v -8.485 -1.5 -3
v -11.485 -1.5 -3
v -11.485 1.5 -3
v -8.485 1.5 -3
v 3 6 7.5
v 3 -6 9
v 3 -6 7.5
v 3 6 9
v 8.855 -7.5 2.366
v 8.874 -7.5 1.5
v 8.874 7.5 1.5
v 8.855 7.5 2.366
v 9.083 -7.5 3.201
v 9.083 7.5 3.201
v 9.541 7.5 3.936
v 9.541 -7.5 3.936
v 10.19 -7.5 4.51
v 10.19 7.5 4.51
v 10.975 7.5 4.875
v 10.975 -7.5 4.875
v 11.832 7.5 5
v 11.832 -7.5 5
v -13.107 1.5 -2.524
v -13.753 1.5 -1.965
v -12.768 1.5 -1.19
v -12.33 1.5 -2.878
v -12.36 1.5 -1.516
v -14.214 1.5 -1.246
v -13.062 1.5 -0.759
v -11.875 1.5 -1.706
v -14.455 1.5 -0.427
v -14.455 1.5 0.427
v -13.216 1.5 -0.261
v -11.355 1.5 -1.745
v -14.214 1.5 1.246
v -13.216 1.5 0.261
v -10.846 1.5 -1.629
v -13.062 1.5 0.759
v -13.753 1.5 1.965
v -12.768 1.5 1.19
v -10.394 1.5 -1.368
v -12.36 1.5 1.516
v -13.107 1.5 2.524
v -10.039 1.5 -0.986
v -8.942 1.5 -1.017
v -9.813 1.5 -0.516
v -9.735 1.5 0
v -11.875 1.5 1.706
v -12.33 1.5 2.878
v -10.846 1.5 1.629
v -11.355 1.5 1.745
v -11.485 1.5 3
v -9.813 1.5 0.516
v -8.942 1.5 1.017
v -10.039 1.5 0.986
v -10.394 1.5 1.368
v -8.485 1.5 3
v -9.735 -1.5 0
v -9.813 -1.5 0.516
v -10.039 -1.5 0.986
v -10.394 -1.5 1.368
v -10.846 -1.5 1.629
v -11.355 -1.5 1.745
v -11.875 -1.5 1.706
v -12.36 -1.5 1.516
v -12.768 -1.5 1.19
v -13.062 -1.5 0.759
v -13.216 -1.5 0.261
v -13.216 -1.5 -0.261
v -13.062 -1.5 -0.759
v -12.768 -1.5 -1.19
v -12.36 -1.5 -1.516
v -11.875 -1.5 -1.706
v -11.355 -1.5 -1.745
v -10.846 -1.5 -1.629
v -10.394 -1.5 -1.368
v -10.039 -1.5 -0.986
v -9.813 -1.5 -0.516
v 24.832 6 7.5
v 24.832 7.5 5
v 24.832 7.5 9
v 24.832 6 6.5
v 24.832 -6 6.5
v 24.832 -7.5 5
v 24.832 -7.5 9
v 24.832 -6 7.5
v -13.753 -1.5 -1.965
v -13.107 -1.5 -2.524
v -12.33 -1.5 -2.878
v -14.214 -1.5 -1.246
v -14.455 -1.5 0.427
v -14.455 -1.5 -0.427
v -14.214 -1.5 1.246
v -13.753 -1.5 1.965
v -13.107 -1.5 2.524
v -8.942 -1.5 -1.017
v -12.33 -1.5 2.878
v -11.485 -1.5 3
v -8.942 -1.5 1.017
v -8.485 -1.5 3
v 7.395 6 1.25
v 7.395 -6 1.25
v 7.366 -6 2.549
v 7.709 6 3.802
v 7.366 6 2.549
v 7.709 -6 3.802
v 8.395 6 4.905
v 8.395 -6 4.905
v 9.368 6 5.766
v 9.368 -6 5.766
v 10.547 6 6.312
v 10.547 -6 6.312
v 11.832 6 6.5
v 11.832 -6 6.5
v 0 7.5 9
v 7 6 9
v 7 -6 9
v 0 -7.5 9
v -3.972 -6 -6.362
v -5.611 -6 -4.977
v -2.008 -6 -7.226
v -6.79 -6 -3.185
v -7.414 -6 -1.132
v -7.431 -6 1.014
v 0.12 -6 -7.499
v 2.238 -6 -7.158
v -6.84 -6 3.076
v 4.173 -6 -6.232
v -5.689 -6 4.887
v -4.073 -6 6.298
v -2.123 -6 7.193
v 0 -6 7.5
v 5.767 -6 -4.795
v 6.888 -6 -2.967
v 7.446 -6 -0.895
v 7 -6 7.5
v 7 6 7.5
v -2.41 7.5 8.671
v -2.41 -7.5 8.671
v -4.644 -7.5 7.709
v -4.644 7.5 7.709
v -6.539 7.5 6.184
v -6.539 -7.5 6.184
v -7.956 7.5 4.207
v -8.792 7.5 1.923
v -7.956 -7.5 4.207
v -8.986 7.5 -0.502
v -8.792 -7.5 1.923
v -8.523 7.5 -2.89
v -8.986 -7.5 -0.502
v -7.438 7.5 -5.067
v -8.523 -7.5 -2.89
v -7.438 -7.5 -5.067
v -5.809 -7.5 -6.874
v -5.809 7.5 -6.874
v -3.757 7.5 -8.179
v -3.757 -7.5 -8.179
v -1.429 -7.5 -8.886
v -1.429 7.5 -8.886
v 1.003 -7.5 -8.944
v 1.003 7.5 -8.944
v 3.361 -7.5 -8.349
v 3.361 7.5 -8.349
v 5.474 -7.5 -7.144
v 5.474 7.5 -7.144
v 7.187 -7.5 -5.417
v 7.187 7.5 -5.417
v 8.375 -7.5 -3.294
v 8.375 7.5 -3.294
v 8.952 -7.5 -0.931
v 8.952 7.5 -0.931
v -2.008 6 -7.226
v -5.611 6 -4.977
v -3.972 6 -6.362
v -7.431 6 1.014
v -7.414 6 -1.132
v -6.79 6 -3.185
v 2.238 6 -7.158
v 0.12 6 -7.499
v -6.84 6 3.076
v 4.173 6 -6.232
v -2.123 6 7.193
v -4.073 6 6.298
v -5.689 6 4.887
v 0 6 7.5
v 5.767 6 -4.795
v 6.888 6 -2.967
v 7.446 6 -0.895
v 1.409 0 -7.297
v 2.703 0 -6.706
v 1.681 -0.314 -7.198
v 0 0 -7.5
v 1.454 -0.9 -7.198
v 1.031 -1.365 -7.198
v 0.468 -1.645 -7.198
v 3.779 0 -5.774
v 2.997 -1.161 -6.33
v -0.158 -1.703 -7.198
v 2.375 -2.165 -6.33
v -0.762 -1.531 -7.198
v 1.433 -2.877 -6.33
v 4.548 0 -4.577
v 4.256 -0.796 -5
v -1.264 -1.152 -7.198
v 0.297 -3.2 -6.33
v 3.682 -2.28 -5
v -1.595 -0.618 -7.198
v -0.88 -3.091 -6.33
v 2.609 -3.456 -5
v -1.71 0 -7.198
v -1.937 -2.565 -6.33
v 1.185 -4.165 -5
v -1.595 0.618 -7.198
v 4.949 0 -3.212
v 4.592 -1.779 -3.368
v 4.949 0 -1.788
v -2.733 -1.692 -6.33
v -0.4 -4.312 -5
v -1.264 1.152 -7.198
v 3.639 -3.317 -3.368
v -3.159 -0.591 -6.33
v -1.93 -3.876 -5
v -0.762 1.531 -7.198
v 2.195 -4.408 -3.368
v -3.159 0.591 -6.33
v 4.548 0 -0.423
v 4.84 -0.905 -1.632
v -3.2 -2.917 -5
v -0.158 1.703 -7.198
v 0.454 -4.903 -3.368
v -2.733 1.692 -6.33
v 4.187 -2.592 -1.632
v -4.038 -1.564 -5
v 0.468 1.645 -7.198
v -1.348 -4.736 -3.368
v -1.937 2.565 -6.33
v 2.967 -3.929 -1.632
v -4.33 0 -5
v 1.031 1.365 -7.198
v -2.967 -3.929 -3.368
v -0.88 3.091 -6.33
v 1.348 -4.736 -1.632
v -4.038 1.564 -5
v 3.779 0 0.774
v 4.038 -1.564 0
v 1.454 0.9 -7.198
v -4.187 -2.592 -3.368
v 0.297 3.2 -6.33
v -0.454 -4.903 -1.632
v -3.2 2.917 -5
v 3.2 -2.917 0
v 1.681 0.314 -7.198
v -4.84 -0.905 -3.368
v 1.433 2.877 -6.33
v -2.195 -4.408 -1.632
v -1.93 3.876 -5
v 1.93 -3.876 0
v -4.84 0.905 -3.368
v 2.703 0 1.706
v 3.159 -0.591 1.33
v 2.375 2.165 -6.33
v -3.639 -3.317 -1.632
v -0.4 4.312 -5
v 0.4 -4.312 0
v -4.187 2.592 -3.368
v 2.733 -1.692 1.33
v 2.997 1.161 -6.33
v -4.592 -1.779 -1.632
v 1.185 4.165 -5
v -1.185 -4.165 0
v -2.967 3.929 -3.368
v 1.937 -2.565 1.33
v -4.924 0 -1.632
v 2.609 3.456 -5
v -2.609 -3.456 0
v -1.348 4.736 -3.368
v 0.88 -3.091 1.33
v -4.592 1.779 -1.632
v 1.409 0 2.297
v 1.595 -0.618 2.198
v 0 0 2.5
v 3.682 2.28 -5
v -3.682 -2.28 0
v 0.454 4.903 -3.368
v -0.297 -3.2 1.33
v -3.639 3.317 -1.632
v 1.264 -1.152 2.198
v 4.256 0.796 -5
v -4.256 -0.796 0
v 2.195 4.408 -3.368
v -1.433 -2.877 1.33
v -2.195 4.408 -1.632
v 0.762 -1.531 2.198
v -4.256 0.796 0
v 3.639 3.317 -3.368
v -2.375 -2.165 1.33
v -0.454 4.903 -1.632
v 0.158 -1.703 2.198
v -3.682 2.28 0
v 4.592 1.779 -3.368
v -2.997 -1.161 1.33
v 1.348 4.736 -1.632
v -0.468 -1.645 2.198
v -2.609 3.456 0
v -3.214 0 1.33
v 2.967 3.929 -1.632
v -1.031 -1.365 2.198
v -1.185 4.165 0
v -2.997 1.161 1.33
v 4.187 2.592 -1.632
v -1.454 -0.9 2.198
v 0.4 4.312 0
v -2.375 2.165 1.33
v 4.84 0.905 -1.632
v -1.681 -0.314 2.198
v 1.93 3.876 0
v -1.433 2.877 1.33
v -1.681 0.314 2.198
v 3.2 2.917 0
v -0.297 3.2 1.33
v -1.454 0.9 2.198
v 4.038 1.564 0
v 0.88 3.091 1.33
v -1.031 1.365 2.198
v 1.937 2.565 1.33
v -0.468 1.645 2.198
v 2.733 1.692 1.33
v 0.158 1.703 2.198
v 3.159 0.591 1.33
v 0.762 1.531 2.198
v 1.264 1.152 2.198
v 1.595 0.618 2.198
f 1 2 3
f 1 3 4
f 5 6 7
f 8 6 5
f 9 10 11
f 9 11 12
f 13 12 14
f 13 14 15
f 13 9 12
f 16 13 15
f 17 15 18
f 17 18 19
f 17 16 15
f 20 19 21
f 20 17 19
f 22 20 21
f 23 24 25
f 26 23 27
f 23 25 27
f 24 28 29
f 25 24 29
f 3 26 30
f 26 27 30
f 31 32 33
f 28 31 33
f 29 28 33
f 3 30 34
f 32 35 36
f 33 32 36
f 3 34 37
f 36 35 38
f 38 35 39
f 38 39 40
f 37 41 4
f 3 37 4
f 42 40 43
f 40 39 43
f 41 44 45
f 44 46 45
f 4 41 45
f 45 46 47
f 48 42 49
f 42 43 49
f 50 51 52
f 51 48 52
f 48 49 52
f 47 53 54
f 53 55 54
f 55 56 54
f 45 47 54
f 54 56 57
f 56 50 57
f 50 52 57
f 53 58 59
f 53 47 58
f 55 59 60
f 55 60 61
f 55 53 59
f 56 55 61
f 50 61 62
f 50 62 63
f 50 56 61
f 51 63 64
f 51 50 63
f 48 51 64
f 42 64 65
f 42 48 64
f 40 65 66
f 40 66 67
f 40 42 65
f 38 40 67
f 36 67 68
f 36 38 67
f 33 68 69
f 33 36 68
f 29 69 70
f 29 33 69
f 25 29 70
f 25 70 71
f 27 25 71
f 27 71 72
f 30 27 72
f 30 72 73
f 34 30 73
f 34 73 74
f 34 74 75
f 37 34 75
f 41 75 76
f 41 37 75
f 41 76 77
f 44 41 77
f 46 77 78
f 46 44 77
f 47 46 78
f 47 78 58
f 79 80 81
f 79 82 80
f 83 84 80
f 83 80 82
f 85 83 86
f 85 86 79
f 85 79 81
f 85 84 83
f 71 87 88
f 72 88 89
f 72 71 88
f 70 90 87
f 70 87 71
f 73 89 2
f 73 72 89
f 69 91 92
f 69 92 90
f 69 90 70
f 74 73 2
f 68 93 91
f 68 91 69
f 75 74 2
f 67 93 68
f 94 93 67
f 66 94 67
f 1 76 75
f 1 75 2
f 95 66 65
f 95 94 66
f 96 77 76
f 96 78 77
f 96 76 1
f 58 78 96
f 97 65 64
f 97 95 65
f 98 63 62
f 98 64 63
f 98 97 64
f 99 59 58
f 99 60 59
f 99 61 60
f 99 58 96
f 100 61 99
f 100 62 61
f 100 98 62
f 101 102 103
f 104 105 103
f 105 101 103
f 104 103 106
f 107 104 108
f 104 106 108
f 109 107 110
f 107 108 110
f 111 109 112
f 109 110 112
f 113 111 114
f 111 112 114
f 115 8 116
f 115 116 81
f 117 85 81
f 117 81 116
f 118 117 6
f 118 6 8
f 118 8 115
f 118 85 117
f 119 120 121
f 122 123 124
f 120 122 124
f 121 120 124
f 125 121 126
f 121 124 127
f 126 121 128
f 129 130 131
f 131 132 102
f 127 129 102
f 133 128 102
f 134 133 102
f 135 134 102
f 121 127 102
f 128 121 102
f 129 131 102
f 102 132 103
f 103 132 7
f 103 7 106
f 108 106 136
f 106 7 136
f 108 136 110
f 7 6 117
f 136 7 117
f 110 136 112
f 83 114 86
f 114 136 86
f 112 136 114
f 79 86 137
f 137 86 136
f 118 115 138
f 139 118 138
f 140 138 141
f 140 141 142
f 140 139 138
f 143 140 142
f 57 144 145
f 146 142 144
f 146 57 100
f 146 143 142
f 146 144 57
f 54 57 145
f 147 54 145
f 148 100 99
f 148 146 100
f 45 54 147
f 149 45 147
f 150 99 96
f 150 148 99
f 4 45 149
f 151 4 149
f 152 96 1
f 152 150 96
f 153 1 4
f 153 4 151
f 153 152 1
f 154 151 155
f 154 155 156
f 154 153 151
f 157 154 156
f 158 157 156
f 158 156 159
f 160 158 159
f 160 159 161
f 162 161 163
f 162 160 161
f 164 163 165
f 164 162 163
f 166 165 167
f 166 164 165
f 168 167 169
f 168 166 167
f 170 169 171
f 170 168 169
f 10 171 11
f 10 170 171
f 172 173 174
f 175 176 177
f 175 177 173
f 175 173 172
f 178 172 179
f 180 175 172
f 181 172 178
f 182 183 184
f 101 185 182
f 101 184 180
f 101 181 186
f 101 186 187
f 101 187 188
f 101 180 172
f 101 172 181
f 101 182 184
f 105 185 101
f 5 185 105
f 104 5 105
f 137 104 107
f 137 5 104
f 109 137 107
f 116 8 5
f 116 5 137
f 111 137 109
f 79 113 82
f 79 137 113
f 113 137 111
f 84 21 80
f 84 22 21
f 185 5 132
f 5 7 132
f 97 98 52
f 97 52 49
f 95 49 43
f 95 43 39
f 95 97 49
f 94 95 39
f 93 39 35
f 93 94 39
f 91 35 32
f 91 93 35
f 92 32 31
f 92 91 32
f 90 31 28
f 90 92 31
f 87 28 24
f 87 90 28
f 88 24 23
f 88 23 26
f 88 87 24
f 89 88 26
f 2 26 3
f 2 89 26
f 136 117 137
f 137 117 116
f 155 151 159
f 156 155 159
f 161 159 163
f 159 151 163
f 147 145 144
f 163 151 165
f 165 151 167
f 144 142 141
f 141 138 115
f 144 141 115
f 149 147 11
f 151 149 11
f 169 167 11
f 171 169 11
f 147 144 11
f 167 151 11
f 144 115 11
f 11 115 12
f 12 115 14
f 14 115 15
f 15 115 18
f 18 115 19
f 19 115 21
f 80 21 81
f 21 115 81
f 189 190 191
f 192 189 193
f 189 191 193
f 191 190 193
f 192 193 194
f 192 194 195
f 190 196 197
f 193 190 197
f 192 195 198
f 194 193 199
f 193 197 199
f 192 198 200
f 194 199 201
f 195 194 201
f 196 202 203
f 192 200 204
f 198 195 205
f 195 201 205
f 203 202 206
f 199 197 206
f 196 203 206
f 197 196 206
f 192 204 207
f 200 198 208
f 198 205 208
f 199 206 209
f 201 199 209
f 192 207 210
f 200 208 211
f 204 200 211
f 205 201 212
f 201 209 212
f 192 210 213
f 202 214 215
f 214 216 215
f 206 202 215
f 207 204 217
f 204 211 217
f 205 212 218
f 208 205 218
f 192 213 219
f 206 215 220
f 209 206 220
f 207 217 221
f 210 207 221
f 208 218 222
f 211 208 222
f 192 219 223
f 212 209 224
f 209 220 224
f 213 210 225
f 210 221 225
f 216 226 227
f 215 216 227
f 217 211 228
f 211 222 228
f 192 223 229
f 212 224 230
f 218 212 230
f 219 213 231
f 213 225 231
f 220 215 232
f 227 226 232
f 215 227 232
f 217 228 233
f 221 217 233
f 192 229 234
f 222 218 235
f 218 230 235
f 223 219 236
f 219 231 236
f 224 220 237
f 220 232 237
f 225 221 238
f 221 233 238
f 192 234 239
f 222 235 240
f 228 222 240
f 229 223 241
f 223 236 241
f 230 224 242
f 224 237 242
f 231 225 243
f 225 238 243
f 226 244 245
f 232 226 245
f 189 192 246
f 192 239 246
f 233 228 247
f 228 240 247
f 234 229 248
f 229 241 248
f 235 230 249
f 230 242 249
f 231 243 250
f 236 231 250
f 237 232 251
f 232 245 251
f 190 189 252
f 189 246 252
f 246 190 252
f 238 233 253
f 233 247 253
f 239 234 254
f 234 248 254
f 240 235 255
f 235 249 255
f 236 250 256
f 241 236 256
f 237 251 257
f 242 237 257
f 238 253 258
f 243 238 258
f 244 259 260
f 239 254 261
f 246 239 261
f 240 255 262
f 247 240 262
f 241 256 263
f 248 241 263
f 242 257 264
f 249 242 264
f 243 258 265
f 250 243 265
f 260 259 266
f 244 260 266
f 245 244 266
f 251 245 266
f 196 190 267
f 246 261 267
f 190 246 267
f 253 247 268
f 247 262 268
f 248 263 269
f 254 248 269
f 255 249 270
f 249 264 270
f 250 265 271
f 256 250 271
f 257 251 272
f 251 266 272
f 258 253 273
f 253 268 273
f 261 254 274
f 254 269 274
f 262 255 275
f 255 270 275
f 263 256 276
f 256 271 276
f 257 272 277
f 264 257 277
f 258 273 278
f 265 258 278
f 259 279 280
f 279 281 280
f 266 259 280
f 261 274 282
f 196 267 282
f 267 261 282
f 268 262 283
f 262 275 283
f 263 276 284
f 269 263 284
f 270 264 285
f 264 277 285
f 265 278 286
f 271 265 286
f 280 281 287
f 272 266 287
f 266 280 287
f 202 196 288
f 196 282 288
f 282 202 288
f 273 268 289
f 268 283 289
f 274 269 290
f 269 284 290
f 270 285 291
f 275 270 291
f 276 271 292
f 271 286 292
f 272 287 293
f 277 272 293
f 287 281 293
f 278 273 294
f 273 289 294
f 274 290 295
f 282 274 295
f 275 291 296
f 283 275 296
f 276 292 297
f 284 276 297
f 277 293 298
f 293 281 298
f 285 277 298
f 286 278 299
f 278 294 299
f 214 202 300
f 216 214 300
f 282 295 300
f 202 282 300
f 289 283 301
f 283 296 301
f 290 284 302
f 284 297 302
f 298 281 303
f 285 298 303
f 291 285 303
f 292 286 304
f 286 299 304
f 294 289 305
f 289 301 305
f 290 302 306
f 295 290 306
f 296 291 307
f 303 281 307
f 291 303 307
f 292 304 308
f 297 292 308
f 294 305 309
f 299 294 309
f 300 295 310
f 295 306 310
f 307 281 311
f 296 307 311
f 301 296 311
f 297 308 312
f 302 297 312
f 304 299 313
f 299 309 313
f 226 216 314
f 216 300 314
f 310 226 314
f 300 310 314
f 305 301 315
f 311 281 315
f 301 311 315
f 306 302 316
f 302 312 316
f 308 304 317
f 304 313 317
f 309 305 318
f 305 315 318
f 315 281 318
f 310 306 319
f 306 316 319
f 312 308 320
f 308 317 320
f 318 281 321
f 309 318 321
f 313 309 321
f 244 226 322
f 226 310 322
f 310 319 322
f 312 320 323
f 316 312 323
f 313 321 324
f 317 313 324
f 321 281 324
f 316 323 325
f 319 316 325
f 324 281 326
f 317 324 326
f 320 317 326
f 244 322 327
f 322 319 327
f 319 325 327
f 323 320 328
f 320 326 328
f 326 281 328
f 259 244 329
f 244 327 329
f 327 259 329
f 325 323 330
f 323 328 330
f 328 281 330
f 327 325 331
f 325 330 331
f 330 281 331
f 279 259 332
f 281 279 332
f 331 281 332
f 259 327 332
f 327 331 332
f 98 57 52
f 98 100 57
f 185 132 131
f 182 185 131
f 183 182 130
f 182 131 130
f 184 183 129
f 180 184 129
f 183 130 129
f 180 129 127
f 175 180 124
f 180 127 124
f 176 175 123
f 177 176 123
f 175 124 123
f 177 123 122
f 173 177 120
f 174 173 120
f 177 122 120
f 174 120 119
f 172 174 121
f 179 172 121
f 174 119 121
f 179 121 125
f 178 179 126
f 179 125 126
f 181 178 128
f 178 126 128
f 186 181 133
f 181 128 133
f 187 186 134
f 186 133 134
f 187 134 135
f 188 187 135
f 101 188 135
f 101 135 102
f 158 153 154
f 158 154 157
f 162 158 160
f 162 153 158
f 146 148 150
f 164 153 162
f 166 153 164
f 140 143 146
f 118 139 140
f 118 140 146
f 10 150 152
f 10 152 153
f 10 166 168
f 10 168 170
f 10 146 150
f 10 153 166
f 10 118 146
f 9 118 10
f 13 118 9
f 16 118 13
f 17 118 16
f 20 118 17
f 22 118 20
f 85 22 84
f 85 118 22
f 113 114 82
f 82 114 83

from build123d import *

# Parameters (mm, degrees)
F1_DEPTH = 7.5
F2_T     = -1.5
F3_W     = 4
F3_H     = 12
F4_DEPTH = 1.5
F5_R     = 1.75
F6_DEPTH = 1.5


with BuildPart() as f1:
    # F0 (on Front) → F1 (new body, symmetric)
    with BuildSketch(Plane.XZ):
        with BuildLine():
            Line((24.83216, 9), (0, 9))
            ThreePointArc((0, 9), (-5.809475, -6.873864), (8.87412, 1.5))
            ThreePointArc((8.87412, 1.5), (9.540872, 3.936492), (11.83216, 5))
            Line((11.83216, 5), (24.83216, 5))
            Line((24.83216, 5), (24.83216, 9))
        make_face()
    extrude(amount=F1_DEPTH, both=True)

    # F2
    f2_openings = [f1.faces().sort_by_distance(p)[0] for p in [
        (24.83216, 0, 7),
    ]]
    offset(amount=F2_T, openings=f2_openings)

    # F3 (on face) → F4 (cut)
    with BuildSketch(Plane.XY.offset(9)):
        with Locations((5, 0)):
            Rectangle(F3_W, F3_H)
    extrude(amount=-F4_DEPTH, mode=Mode.SUBTRACT)

    # F5 (on Front) → F6 (join, symmetric)
    with BuildSketch(Plane.XZ):
        with BuildLine():
            Line((-8.485281, 3), (-11.485281, 3))
            ThreePointArc((-11.485281, 3), (-14.485281, 0), (-11.485281, -3))
            Line((-11.485281, -3), (-8.485281, -3))
            Line((-8.485281, -3), (-8.485281, 3))
        make_face()
        with Locations((-11.485281, 0)):
            Circle(F5_R, mode=Mode.SUBTRACT)
    extrude(amount=F6_DEPTH, both=True)


with BuildPart() as f8:
    # F7 (on Front) → F8 (revolve)
    with BuildSketch(Plane.XZ):
        with BuildLine():
            Line((0, 2.5), (0, -7.5))
            ThreePointArc((0, -7.5), (5, -2.5), (0, 2.5))
        make_face()
    revolve(axis=Axis((0, 0, -2.5), (0, 0, -1)))


solid = Compound([f1.part, f8.part])
